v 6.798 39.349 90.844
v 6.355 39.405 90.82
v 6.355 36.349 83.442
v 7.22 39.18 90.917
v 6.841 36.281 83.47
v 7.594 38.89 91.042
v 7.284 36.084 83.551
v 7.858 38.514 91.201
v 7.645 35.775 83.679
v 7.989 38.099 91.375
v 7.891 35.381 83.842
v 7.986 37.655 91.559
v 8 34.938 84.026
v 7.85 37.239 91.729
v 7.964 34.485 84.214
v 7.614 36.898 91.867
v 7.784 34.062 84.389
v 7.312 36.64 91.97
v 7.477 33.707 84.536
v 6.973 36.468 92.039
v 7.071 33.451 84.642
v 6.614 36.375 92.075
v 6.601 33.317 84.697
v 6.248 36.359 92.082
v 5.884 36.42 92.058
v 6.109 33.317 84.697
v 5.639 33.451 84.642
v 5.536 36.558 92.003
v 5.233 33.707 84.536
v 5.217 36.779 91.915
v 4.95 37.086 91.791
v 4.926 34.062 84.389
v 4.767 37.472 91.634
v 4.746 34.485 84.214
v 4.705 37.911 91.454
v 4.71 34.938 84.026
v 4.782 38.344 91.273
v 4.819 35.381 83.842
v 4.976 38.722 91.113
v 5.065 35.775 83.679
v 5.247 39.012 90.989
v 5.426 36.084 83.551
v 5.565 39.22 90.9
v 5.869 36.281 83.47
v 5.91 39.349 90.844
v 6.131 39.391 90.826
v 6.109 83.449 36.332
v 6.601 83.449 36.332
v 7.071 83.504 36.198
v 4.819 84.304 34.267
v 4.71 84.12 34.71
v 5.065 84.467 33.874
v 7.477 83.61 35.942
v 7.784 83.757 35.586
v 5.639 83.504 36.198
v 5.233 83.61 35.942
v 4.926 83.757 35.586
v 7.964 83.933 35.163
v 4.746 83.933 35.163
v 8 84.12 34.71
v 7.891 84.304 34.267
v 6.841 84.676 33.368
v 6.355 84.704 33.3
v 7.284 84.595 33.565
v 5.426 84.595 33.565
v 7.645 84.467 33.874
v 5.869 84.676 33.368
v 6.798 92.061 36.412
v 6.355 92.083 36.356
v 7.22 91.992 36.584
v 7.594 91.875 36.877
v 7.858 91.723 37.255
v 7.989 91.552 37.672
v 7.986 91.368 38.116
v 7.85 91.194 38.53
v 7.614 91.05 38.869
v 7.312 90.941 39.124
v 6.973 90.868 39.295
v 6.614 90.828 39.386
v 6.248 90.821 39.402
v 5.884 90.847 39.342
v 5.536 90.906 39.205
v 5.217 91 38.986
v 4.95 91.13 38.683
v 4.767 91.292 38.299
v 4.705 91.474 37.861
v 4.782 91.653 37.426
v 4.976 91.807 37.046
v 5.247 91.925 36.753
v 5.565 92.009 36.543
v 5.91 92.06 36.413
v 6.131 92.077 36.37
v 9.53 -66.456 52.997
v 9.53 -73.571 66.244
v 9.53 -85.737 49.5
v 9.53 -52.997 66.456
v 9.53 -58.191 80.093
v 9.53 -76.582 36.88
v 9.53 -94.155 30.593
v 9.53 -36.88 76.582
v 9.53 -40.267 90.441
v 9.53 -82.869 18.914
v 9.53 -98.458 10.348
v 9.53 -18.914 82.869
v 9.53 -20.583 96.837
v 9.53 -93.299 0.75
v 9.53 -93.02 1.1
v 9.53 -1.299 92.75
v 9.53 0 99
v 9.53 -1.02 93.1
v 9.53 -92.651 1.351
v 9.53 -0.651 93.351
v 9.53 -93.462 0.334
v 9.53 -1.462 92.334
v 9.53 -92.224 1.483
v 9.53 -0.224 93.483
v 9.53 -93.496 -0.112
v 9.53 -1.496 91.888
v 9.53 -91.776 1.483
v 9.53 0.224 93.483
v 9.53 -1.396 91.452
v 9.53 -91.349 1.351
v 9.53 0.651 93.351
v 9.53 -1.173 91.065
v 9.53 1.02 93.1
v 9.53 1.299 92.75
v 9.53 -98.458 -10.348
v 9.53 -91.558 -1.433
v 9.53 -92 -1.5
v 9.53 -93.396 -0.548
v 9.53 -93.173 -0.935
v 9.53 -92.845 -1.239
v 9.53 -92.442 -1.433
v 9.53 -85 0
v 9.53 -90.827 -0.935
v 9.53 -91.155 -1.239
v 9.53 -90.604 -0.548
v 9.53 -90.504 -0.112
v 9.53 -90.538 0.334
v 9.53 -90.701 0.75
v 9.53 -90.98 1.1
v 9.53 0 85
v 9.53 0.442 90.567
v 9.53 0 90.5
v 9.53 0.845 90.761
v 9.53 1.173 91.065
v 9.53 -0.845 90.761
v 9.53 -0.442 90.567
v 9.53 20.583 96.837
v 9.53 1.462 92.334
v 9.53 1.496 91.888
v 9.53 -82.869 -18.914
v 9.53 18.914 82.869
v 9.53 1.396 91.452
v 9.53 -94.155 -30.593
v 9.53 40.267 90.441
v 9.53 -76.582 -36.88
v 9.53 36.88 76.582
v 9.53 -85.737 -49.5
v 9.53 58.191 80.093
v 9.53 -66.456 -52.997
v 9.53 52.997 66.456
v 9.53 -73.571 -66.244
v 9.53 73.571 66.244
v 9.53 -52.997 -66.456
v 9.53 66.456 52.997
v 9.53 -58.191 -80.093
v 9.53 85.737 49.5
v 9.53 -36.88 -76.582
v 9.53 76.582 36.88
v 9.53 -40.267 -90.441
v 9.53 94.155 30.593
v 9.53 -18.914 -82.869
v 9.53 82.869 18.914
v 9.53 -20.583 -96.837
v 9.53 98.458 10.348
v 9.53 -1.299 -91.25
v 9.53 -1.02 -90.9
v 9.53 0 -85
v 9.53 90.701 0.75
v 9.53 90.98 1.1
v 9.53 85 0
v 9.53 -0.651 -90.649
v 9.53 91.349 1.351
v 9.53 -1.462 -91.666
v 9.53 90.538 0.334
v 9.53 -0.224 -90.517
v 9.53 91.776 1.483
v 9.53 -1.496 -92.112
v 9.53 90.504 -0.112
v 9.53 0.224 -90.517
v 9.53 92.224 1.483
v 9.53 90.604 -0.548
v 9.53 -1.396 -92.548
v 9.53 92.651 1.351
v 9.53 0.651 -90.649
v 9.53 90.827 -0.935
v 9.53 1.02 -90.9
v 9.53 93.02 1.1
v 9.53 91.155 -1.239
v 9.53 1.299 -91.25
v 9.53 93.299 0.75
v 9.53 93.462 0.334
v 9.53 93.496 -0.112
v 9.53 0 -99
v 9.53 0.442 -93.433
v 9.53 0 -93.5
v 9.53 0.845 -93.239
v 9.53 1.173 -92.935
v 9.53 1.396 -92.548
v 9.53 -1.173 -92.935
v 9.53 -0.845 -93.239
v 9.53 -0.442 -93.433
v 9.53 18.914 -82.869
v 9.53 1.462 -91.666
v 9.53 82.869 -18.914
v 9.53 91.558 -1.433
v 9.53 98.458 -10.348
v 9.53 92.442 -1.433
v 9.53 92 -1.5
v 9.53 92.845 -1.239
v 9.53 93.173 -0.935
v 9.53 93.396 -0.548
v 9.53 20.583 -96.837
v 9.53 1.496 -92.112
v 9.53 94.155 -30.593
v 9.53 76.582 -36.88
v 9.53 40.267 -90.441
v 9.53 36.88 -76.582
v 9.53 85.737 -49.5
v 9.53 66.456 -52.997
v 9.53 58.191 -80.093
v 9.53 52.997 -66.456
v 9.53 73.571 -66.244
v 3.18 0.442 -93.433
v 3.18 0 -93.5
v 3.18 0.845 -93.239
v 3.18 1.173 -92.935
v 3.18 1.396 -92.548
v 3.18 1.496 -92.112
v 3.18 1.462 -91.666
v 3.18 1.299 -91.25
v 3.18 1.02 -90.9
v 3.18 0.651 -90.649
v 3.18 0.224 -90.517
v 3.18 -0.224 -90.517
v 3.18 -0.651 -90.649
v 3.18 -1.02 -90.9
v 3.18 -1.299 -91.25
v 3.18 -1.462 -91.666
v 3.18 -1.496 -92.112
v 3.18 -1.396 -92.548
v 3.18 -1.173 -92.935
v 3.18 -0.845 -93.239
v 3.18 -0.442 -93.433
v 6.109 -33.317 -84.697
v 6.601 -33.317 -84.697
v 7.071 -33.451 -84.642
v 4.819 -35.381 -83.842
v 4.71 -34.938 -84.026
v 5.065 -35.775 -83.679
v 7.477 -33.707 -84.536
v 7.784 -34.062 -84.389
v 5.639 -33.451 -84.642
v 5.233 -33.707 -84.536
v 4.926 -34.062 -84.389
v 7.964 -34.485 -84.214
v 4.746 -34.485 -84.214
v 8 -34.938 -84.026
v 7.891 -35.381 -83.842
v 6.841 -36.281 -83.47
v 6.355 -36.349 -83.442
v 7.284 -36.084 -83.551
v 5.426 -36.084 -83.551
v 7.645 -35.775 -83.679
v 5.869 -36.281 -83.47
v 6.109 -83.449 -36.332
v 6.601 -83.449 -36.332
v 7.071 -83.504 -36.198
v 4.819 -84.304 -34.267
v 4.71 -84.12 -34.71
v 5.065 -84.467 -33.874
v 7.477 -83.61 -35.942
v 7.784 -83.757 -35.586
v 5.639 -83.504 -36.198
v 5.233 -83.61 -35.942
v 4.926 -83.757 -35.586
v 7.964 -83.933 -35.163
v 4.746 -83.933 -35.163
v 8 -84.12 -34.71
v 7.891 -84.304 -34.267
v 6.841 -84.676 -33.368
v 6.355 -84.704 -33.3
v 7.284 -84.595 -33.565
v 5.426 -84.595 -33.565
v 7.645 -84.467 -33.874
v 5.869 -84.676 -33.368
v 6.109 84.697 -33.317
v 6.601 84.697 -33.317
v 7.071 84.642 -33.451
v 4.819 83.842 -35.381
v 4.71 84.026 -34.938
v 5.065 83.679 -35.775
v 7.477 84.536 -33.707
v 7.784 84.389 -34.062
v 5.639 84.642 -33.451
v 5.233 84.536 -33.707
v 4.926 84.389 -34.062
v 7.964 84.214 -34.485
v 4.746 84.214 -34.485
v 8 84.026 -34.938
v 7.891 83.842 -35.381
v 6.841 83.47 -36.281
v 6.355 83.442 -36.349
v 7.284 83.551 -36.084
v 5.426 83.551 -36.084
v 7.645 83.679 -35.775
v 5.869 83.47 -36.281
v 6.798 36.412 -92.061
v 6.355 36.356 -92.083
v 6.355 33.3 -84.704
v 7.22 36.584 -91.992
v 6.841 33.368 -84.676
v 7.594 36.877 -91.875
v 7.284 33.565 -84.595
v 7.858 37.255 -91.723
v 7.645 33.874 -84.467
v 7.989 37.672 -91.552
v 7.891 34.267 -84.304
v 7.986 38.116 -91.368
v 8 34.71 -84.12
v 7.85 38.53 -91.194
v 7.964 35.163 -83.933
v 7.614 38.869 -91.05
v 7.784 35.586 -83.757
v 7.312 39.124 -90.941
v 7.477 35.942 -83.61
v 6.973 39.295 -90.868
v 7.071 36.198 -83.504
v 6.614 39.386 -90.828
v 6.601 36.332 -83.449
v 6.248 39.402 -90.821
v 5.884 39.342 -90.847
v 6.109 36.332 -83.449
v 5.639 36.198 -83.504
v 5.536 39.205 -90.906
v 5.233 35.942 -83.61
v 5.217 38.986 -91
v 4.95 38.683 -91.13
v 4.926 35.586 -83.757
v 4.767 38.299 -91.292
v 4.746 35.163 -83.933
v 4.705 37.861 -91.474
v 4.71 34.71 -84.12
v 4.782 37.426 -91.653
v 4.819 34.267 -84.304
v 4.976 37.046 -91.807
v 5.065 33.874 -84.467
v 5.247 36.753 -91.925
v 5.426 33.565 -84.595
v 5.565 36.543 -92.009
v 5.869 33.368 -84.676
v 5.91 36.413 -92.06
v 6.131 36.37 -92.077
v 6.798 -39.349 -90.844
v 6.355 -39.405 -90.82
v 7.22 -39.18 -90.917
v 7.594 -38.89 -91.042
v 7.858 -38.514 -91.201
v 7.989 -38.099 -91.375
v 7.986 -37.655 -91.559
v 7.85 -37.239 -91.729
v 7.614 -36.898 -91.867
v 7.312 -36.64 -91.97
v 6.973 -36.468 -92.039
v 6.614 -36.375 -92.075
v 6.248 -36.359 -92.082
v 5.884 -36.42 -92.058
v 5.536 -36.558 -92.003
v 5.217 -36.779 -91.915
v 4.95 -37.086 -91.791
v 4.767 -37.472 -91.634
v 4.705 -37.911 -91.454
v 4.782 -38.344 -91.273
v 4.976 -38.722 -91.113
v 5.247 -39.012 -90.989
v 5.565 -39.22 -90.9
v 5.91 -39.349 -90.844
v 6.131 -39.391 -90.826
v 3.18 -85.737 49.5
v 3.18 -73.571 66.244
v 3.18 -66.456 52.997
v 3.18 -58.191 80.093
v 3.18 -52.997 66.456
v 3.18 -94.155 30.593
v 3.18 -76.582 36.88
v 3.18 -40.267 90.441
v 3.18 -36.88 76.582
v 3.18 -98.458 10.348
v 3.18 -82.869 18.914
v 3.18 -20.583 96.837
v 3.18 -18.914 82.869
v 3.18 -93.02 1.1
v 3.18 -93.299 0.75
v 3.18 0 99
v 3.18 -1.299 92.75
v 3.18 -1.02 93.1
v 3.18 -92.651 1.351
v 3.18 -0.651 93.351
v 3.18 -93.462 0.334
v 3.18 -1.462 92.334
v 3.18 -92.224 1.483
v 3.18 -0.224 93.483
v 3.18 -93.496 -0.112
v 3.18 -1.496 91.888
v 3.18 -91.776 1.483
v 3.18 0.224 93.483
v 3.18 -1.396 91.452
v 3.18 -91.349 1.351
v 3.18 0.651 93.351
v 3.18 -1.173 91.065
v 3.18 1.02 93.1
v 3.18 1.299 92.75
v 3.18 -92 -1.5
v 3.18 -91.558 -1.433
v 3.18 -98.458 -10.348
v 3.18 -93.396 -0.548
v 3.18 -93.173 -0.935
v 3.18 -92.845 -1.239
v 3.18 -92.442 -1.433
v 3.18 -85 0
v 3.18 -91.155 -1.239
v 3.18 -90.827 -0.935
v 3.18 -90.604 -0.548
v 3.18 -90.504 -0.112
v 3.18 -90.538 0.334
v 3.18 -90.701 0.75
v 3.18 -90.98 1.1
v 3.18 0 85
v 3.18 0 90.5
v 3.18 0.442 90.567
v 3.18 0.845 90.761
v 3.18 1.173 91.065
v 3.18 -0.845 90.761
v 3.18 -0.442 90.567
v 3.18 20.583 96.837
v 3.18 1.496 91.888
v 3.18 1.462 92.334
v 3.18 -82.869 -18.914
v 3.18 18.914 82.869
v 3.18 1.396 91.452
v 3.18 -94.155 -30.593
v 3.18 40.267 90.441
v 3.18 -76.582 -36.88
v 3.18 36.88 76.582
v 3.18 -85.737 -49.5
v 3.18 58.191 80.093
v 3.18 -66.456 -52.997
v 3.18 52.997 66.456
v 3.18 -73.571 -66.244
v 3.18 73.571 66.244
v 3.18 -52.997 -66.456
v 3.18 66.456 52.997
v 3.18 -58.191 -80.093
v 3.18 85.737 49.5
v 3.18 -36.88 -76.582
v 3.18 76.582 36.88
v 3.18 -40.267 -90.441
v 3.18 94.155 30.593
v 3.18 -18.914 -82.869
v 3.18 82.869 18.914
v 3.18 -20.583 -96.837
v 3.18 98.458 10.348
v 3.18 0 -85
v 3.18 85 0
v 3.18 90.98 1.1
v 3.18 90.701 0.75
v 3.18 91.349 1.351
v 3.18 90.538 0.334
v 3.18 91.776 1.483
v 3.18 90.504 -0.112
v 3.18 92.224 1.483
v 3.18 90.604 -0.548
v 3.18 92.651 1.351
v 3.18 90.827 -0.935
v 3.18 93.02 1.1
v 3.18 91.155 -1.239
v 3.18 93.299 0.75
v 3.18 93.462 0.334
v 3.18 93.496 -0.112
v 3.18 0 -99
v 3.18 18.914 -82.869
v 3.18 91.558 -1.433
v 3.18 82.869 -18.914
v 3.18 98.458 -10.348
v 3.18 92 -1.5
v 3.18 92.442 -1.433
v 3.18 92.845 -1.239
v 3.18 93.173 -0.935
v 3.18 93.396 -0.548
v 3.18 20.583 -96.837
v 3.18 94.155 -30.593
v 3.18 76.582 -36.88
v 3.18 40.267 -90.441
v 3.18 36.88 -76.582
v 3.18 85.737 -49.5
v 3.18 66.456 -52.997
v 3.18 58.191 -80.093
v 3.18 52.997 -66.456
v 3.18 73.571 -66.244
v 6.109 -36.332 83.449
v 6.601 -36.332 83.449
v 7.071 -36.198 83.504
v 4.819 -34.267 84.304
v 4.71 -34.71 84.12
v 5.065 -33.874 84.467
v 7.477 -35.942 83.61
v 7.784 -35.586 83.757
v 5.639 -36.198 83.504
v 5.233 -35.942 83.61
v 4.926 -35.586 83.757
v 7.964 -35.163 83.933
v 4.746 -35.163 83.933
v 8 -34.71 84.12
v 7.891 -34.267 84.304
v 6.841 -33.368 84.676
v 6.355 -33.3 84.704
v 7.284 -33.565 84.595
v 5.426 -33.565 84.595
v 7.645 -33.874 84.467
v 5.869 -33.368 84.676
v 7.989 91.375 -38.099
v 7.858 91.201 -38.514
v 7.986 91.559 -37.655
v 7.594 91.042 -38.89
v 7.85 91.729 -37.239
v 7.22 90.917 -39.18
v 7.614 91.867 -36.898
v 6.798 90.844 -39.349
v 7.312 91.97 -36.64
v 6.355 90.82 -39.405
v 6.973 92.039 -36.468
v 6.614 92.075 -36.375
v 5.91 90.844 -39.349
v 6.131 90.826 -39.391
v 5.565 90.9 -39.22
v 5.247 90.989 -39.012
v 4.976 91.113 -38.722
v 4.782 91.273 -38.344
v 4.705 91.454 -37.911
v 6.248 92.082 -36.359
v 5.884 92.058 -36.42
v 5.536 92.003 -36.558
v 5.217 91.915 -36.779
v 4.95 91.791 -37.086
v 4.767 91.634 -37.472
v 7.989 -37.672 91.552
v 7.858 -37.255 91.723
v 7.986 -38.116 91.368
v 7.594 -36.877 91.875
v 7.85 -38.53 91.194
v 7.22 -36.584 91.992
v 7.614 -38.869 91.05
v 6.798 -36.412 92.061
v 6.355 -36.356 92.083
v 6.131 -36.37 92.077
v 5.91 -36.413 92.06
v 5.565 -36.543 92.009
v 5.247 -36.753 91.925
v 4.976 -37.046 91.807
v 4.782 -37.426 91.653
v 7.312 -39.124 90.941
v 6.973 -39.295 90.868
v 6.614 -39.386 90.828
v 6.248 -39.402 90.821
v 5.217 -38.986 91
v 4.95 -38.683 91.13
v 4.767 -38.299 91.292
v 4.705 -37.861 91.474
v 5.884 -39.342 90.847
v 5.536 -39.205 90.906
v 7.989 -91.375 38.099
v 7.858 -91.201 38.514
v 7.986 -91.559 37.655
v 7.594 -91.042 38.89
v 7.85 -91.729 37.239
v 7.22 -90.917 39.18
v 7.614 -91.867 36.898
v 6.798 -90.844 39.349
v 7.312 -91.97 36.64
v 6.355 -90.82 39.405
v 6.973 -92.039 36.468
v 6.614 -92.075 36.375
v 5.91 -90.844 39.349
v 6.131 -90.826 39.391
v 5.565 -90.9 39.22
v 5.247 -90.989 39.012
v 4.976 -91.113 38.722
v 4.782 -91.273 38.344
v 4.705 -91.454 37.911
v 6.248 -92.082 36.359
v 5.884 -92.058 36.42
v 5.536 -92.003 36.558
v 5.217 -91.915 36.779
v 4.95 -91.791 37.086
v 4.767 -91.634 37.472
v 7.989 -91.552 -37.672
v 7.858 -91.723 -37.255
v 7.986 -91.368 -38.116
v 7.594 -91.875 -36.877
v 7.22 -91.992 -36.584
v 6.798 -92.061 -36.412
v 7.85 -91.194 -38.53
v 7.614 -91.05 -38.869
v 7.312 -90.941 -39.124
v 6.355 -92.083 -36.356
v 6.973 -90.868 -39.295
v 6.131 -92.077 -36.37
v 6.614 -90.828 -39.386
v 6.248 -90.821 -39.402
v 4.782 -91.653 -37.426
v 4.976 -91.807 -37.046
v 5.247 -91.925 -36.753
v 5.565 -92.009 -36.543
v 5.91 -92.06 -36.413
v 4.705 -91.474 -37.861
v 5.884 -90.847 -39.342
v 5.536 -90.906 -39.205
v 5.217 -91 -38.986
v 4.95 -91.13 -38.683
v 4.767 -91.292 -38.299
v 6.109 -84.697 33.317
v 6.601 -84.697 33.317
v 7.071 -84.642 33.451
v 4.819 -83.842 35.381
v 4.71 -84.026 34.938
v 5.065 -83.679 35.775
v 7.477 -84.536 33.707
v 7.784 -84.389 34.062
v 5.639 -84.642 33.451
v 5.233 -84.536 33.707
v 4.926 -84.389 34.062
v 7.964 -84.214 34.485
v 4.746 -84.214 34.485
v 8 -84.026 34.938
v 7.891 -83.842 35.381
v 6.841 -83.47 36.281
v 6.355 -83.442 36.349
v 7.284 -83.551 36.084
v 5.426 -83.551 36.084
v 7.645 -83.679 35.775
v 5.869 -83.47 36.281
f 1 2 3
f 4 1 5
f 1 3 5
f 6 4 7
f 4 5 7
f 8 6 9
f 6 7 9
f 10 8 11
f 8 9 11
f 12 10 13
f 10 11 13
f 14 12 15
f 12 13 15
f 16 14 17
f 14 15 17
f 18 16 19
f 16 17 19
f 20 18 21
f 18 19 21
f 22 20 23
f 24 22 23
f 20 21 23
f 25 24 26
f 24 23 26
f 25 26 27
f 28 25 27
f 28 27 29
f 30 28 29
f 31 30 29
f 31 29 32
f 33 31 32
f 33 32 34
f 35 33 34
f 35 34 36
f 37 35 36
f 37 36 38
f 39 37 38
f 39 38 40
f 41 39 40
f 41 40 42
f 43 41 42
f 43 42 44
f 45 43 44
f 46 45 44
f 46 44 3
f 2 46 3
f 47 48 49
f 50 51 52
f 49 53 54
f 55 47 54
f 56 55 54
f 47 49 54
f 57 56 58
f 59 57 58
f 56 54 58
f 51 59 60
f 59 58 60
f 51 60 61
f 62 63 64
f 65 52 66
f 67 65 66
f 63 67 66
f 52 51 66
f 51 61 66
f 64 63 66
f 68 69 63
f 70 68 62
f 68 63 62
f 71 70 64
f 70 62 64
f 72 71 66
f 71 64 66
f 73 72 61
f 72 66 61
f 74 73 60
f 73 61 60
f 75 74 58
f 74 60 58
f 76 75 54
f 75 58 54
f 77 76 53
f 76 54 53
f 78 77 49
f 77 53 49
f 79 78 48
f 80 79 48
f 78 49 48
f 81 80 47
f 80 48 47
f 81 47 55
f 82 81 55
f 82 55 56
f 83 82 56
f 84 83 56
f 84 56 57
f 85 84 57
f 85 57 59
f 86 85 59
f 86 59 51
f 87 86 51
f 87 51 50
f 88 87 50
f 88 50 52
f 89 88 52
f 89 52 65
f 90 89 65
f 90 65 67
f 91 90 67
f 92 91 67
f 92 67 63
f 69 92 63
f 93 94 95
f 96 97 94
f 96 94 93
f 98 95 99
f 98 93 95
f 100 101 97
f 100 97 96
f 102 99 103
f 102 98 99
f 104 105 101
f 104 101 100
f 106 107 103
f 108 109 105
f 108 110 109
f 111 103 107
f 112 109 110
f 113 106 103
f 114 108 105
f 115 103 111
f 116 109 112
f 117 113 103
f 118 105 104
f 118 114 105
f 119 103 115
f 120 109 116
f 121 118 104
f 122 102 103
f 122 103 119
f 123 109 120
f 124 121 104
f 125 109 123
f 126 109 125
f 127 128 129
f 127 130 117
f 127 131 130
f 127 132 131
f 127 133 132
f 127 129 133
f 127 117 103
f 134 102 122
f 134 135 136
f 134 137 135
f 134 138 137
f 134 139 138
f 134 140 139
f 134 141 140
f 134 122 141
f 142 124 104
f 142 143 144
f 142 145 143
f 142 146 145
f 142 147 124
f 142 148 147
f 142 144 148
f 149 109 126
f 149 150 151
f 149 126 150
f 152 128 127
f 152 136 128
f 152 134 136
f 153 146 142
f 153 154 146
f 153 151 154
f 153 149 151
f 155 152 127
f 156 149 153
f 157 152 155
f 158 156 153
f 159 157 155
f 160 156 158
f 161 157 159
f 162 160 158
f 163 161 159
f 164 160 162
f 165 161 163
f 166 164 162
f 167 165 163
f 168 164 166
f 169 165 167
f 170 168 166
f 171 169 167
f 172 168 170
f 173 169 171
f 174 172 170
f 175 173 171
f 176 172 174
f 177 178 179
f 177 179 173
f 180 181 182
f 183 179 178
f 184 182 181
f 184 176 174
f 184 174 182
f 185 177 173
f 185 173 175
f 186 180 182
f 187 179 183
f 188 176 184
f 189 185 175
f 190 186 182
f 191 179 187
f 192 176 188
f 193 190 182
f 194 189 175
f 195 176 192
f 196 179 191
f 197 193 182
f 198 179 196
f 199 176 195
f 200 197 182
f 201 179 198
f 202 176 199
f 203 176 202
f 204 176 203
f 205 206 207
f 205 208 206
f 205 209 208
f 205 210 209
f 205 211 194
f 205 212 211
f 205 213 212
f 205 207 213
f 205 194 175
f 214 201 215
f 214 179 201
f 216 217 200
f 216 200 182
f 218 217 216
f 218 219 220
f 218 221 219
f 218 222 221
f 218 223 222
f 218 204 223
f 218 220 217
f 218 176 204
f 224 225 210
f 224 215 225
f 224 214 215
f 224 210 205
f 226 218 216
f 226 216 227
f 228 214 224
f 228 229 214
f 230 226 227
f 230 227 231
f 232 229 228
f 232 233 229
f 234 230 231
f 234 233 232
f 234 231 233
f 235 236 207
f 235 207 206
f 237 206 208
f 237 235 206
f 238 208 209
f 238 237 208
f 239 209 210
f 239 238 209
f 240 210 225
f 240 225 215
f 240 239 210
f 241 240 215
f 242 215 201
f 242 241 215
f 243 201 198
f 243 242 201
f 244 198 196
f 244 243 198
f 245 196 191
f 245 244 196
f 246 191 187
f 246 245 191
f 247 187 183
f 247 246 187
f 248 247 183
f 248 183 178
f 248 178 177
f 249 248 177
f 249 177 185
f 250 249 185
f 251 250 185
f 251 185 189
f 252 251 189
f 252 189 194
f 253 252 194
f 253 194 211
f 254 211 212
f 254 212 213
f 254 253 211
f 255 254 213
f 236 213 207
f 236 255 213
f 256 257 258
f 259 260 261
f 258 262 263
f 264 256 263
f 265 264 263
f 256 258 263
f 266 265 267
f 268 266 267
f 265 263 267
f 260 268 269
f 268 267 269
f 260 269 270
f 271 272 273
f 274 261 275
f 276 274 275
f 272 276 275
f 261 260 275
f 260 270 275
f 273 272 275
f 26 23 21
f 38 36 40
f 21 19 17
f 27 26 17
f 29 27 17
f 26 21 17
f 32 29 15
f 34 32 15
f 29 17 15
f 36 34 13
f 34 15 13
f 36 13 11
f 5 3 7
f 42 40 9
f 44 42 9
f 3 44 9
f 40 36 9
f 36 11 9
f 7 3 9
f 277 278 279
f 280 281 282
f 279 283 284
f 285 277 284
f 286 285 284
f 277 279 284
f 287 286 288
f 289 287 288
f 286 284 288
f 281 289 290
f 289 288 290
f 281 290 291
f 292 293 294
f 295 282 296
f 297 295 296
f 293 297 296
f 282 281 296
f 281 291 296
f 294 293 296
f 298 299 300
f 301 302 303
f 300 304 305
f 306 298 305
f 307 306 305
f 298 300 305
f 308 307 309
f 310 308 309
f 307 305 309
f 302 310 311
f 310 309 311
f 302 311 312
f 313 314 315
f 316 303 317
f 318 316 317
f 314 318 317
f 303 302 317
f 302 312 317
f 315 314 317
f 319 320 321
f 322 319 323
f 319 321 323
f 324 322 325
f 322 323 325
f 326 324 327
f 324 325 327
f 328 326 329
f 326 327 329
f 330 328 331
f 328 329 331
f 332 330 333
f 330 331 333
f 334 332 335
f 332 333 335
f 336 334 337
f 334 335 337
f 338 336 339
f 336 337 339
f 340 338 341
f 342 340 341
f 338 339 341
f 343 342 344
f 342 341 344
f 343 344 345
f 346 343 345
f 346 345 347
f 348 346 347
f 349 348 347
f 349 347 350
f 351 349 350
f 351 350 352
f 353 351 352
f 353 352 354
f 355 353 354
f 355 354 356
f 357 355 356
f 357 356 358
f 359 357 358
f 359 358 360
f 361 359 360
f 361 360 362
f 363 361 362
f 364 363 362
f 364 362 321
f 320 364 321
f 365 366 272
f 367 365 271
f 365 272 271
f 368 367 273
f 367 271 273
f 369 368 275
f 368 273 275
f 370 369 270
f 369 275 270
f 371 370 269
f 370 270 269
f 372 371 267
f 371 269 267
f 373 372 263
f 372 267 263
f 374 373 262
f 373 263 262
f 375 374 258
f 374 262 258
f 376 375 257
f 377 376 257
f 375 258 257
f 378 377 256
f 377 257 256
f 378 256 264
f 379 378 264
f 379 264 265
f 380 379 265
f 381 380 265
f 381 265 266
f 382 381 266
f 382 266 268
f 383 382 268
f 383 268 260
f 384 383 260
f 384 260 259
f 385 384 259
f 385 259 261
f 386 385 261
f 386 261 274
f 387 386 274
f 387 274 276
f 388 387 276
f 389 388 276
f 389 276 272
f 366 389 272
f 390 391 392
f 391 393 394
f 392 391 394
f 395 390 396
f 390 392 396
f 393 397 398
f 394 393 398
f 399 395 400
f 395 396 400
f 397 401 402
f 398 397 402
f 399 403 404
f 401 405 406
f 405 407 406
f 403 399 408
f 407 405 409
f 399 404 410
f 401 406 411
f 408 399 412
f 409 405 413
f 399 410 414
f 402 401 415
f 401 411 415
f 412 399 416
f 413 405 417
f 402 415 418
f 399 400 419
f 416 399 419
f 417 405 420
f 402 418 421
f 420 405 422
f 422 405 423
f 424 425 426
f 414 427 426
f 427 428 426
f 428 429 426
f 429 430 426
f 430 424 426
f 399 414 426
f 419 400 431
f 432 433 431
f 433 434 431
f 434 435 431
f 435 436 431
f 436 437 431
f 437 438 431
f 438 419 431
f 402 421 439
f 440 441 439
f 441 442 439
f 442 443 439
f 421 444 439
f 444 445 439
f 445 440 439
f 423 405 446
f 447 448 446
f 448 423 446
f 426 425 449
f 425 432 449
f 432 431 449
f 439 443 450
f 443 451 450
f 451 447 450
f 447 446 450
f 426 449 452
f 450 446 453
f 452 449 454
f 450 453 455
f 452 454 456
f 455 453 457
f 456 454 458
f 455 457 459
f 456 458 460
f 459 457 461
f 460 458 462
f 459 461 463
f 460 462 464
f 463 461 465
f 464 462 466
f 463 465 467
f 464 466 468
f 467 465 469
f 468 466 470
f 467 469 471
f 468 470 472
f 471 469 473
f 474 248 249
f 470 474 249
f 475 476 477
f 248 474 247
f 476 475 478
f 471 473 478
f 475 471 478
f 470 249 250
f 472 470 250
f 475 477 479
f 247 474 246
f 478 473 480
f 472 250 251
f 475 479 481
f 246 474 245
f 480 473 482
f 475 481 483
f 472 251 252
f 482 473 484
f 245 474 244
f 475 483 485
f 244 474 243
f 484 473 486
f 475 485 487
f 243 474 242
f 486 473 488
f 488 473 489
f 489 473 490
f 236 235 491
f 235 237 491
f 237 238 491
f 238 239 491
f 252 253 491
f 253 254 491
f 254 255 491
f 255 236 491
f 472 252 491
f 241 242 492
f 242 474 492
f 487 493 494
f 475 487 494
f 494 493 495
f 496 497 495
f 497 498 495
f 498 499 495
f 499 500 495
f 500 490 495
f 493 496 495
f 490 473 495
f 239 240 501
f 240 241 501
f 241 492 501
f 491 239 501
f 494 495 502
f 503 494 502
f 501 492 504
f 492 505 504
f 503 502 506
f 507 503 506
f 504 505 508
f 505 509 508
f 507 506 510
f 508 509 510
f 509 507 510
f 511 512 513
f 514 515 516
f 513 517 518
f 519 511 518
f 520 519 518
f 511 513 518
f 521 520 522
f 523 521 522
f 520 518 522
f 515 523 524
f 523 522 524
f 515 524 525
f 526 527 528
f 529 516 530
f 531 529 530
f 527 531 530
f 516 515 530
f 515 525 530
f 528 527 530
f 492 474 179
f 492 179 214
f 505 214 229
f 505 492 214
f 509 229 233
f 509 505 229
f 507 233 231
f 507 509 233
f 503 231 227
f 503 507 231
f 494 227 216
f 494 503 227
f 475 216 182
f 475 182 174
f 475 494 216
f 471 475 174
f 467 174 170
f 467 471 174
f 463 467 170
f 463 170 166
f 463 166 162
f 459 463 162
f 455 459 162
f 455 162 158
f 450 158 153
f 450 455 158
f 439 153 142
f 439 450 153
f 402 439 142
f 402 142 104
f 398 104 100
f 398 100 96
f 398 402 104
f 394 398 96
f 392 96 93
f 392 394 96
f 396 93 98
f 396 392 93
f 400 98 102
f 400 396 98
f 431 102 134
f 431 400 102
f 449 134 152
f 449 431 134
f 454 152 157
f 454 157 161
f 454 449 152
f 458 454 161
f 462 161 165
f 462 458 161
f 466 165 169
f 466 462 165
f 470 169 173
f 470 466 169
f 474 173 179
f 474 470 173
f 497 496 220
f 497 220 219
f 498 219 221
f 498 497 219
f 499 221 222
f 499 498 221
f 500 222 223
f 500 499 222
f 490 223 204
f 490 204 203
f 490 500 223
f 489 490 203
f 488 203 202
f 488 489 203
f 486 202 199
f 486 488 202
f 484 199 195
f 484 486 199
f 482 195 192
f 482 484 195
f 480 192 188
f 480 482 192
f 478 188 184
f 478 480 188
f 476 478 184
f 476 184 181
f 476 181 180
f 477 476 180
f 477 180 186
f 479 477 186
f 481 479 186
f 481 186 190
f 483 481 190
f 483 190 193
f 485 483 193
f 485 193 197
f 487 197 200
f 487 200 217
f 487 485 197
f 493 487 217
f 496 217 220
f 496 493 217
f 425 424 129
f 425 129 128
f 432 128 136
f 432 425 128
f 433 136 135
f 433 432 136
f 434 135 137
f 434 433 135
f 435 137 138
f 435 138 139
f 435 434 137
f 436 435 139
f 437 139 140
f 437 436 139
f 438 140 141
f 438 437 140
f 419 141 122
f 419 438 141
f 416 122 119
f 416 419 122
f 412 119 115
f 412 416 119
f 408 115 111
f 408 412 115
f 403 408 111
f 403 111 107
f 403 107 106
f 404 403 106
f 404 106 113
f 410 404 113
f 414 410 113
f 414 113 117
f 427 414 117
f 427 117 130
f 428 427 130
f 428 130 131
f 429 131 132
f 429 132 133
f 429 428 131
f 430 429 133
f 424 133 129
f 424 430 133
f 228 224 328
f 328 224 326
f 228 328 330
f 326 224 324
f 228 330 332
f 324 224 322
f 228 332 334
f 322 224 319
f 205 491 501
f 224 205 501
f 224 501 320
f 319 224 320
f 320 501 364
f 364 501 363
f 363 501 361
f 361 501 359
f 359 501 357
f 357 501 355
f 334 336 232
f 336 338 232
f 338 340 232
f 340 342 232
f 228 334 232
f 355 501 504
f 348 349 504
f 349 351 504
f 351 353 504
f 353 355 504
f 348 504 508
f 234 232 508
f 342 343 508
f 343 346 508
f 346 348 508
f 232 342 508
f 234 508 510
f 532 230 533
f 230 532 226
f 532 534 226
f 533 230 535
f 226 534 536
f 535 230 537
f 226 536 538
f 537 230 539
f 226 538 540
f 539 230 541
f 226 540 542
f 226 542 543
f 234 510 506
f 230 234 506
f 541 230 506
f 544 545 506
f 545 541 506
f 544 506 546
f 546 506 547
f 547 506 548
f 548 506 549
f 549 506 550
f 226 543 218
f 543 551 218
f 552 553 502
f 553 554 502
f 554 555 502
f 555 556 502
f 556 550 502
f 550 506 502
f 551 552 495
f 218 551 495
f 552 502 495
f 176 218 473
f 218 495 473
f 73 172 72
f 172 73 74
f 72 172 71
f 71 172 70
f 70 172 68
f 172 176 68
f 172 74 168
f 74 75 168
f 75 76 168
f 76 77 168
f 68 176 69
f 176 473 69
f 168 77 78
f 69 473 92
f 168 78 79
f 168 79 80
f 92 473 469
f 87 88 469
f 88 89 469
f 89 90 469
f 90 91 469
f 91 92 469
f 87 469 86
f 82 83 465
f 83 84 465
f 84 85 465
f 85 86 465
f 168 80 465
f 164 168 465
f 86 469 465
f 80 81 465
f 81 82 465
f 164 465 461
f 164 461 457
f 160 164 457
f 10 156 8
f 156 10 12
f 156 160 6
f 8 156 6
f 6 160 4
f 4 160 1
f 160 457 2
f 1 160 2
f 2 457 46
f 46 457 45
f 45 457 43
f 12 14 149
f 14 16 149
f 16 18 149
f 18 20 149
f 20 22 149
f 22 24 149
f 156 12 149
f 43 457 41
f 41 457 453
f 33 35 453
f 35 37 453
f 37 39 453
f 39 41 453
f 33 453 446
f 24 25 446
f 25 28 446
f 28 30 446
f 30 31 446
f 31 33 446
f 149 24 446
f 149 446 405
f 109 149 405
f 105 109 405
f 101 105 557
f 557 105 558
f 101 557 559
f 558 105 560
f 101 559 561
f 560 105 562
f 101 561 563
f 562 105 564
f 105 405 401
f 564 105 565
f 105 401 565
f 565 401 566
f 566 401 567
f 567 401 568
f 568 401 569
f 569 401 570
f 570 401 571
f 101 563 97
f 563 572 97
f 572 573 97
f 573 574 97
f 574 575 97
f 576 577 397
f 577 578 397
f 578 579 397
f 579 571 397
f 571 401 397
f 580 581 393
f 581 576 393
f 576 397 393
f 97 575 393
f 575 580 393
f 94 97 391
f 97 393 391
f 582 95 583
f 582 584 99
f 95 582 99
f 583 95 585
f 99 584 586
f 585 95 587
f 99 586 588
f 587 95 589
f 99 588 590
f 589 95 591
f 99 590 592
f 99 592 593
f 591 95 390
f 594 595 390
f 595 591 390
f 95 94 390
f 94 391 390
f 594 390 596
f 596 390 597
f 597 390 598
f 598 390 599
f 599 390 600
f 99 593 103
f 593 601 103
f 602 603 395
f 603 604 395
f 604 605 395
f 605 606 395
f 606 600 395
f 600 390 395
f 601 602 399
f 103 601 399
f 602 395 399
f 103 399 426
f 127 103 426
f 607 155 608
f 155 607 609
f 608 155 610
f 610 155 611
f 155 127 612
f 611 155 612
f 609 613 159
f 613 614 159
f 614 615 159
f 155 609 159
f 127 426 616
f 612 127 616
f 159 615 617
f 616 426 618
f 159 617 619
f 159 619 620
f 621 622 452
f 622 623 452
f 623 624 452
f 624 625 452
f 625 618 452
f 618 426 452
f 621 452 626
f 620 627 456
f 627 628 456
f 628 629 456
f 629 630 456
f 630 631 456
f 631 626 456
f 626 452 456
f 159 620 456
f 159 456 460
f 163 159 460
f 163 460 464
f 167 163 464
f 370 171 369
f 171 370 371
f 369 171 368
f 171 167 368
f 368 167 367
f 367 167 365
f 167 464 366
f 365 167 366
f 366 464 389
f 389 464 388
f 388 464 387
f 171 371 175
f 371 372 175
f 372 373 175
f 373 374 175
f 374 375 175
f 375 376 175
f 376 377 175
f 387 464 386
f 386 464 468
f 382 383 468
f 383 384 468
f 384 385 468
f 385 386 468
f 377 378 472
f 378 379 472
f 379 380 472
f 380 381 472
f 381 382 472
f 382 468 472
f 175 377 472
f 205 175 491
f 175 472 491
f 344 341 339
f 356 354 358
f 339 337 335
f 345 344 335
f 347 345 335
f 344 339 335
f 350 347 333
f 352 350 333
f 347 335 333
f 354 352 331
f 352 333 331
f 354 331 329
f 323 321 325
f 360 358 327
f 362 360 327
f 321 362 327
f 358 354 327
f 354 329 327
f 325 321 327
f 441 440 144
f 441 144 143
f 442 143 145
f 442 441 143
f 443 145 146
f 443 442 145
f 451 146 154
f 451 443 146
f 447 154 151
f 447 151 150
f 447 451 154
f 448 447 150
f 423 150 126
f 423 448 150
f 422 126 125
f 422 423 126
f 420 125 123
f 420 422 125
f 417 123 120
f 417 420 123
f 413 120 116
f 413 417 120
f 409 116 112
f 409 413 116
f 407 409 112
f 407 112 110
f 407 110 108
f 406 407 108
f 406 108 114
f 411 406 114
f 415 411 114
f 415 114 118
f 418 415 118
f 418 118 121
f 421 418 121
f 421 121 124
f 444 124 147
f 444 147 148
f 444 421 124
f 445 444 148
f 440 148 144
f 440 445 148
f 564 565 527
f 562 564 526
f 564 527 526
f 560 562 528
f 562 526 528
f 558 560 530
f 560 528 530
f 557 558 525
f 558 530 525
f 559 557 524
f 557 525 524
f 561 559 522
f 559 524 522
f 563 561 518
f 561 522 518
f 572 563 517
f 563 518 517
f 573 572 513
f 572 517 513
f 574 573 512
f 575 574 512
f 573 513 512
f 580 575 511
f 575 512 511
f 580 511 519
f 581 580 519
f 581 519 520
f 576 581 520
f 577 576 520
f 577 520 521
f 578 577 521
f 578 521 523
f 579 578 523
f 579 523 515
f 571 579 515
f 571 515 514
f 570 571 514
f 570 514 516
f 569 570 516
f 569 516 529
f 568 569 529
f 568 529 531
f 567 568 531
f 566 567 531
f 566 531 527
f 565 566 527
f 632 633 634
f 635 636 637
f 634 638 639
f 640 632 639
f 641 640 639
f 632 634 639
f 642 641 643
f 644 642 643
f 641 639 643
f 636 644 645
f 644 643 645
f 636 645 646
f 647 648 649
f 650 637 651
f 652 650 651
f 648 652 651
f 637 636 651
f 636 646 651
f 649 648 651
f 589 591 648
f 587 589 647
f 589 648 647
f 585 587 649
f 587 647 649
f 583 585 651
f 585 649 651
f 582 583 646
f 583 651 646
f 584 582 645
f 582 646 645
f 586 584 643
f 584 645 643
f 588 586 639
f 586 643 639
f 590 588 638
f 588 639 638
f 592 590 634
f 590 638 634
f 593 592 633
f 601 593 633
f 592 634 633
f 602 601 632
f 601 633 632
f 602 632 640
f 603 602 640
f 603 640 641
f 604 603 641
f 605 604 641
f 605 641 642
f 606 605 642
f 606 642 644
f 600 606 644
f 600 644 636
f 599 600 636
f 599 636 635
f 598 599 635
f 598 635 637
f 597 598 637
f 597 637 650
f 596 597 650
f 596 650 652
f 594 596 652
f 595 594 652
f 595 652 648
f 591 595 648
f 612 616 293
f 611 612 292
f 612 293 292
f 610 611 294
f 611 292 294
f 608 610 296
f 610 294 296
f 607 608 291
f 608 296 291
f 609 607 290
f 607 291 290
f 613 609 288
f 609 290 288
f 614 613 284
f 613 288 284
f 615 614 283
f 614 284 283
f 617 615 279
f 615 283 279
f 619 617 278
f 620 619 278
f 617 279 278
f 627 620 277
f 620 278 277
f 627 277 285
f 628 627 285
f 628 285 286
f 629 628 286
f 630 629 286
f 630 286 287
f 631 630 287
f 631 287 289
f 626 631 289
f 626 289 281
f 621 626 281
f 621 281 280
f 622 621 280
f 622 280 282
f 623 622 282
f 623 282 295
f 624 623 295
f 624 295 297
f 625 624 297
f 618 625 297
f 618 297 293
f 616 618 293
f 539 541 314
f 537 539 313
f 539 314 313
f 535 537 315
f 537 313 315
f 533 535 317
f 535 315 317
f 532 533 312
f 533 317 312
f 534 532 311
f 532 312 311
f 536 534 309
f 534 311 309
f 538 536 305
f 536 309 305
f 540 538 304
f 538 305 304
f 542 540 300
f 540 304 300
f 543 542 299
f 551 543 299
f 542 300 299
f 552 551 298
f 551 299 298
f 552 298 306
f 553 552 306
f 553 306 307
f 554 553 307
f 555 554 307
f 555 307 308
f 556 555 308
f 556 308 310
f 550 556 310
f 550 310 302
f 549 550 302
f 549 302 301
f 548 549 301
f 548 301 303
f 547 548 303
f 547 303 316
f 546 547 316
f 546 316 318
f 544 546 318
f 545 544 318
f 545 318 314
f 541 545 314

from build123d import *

# Parameters (mm, degrees)
RING_START                = 3.18
RING_SKETCH_R             = 99
RING_SKETCH_R_2           = 85
RING_SKETCH_R_3           = 1.5
RING_DEPTH                = 6.35
WALL_START                = -91
WALL_SCREW_HOLES_SKETCH_R = 1.65
WALL_SCREW_HOLES_DEPTH    = 9
WALL_SCREW_HOLES_X8_COUNT = 8


with BuildPart() as part:
    # Ring Sketch → Ring (new body)
    with BuildSketch(Plane(origin=(0, 0, 0), x_dir=(0, 0, -1), z_dir=(1, 0, 0)).offset(RING_START)):
        Circle(RING_SKETCH_R)
        Circle(RING_SKETCH_R_2, mode=Mode.SUBTRACT)
        with Locations((0, 92)):
            Circle(RING_SKETCH_R_3, mode=Mode.SUBTRACT)
        with Locations((-92, 0)):
            Circle(RING_SKETCH_R_3, mode=Mode.SUBTRACT)
        with Locations((0, -92)):
            Circle(RING_SKETCH_R_3, mode=Mode.SUBTRACT)
        with Locations((92, 0)):
            Circle(RING_SKETCH_R_3, mode=Mode.SUBTRACT)
    extrude(amount=RING_DEPTH)

    # Wall Screw Holes Sketch → Wall Screw Holes (cut)
    with BuildSketch(Plane(origin=(0, 0, 0), x_dir=(-1, 0, 0), z_dir=(0, -0.9238795325112867, -0.3826834323650897)).offset(WALL_START)):
        with Locations((-6.355, 0)):
            Circle(WALL_SCREW_HOLES_SKETCH_R)
    wall_screw_holes = extrude(amount=-WALL_SCREW_HOLES_DEPTH, mode=Mode.SUBTRACT)

    # Wall Screw Holes x8: Wall Screw Holes ×8 about axis
    wall_screw_holes_x8_axis = Axis((9.8475, 0, 0), (-1, 0, 0))
    for i in range(1, WALL_SCREW_HOLES_X8_COUNT):
        add(wall_screw_holes.rotate(wall_screw_holes_x8_axis, i * 360 / WALL_SCREW_HOLES_X8_COUNT), mode=Mode.SUBTRACT)


solid = part.part
